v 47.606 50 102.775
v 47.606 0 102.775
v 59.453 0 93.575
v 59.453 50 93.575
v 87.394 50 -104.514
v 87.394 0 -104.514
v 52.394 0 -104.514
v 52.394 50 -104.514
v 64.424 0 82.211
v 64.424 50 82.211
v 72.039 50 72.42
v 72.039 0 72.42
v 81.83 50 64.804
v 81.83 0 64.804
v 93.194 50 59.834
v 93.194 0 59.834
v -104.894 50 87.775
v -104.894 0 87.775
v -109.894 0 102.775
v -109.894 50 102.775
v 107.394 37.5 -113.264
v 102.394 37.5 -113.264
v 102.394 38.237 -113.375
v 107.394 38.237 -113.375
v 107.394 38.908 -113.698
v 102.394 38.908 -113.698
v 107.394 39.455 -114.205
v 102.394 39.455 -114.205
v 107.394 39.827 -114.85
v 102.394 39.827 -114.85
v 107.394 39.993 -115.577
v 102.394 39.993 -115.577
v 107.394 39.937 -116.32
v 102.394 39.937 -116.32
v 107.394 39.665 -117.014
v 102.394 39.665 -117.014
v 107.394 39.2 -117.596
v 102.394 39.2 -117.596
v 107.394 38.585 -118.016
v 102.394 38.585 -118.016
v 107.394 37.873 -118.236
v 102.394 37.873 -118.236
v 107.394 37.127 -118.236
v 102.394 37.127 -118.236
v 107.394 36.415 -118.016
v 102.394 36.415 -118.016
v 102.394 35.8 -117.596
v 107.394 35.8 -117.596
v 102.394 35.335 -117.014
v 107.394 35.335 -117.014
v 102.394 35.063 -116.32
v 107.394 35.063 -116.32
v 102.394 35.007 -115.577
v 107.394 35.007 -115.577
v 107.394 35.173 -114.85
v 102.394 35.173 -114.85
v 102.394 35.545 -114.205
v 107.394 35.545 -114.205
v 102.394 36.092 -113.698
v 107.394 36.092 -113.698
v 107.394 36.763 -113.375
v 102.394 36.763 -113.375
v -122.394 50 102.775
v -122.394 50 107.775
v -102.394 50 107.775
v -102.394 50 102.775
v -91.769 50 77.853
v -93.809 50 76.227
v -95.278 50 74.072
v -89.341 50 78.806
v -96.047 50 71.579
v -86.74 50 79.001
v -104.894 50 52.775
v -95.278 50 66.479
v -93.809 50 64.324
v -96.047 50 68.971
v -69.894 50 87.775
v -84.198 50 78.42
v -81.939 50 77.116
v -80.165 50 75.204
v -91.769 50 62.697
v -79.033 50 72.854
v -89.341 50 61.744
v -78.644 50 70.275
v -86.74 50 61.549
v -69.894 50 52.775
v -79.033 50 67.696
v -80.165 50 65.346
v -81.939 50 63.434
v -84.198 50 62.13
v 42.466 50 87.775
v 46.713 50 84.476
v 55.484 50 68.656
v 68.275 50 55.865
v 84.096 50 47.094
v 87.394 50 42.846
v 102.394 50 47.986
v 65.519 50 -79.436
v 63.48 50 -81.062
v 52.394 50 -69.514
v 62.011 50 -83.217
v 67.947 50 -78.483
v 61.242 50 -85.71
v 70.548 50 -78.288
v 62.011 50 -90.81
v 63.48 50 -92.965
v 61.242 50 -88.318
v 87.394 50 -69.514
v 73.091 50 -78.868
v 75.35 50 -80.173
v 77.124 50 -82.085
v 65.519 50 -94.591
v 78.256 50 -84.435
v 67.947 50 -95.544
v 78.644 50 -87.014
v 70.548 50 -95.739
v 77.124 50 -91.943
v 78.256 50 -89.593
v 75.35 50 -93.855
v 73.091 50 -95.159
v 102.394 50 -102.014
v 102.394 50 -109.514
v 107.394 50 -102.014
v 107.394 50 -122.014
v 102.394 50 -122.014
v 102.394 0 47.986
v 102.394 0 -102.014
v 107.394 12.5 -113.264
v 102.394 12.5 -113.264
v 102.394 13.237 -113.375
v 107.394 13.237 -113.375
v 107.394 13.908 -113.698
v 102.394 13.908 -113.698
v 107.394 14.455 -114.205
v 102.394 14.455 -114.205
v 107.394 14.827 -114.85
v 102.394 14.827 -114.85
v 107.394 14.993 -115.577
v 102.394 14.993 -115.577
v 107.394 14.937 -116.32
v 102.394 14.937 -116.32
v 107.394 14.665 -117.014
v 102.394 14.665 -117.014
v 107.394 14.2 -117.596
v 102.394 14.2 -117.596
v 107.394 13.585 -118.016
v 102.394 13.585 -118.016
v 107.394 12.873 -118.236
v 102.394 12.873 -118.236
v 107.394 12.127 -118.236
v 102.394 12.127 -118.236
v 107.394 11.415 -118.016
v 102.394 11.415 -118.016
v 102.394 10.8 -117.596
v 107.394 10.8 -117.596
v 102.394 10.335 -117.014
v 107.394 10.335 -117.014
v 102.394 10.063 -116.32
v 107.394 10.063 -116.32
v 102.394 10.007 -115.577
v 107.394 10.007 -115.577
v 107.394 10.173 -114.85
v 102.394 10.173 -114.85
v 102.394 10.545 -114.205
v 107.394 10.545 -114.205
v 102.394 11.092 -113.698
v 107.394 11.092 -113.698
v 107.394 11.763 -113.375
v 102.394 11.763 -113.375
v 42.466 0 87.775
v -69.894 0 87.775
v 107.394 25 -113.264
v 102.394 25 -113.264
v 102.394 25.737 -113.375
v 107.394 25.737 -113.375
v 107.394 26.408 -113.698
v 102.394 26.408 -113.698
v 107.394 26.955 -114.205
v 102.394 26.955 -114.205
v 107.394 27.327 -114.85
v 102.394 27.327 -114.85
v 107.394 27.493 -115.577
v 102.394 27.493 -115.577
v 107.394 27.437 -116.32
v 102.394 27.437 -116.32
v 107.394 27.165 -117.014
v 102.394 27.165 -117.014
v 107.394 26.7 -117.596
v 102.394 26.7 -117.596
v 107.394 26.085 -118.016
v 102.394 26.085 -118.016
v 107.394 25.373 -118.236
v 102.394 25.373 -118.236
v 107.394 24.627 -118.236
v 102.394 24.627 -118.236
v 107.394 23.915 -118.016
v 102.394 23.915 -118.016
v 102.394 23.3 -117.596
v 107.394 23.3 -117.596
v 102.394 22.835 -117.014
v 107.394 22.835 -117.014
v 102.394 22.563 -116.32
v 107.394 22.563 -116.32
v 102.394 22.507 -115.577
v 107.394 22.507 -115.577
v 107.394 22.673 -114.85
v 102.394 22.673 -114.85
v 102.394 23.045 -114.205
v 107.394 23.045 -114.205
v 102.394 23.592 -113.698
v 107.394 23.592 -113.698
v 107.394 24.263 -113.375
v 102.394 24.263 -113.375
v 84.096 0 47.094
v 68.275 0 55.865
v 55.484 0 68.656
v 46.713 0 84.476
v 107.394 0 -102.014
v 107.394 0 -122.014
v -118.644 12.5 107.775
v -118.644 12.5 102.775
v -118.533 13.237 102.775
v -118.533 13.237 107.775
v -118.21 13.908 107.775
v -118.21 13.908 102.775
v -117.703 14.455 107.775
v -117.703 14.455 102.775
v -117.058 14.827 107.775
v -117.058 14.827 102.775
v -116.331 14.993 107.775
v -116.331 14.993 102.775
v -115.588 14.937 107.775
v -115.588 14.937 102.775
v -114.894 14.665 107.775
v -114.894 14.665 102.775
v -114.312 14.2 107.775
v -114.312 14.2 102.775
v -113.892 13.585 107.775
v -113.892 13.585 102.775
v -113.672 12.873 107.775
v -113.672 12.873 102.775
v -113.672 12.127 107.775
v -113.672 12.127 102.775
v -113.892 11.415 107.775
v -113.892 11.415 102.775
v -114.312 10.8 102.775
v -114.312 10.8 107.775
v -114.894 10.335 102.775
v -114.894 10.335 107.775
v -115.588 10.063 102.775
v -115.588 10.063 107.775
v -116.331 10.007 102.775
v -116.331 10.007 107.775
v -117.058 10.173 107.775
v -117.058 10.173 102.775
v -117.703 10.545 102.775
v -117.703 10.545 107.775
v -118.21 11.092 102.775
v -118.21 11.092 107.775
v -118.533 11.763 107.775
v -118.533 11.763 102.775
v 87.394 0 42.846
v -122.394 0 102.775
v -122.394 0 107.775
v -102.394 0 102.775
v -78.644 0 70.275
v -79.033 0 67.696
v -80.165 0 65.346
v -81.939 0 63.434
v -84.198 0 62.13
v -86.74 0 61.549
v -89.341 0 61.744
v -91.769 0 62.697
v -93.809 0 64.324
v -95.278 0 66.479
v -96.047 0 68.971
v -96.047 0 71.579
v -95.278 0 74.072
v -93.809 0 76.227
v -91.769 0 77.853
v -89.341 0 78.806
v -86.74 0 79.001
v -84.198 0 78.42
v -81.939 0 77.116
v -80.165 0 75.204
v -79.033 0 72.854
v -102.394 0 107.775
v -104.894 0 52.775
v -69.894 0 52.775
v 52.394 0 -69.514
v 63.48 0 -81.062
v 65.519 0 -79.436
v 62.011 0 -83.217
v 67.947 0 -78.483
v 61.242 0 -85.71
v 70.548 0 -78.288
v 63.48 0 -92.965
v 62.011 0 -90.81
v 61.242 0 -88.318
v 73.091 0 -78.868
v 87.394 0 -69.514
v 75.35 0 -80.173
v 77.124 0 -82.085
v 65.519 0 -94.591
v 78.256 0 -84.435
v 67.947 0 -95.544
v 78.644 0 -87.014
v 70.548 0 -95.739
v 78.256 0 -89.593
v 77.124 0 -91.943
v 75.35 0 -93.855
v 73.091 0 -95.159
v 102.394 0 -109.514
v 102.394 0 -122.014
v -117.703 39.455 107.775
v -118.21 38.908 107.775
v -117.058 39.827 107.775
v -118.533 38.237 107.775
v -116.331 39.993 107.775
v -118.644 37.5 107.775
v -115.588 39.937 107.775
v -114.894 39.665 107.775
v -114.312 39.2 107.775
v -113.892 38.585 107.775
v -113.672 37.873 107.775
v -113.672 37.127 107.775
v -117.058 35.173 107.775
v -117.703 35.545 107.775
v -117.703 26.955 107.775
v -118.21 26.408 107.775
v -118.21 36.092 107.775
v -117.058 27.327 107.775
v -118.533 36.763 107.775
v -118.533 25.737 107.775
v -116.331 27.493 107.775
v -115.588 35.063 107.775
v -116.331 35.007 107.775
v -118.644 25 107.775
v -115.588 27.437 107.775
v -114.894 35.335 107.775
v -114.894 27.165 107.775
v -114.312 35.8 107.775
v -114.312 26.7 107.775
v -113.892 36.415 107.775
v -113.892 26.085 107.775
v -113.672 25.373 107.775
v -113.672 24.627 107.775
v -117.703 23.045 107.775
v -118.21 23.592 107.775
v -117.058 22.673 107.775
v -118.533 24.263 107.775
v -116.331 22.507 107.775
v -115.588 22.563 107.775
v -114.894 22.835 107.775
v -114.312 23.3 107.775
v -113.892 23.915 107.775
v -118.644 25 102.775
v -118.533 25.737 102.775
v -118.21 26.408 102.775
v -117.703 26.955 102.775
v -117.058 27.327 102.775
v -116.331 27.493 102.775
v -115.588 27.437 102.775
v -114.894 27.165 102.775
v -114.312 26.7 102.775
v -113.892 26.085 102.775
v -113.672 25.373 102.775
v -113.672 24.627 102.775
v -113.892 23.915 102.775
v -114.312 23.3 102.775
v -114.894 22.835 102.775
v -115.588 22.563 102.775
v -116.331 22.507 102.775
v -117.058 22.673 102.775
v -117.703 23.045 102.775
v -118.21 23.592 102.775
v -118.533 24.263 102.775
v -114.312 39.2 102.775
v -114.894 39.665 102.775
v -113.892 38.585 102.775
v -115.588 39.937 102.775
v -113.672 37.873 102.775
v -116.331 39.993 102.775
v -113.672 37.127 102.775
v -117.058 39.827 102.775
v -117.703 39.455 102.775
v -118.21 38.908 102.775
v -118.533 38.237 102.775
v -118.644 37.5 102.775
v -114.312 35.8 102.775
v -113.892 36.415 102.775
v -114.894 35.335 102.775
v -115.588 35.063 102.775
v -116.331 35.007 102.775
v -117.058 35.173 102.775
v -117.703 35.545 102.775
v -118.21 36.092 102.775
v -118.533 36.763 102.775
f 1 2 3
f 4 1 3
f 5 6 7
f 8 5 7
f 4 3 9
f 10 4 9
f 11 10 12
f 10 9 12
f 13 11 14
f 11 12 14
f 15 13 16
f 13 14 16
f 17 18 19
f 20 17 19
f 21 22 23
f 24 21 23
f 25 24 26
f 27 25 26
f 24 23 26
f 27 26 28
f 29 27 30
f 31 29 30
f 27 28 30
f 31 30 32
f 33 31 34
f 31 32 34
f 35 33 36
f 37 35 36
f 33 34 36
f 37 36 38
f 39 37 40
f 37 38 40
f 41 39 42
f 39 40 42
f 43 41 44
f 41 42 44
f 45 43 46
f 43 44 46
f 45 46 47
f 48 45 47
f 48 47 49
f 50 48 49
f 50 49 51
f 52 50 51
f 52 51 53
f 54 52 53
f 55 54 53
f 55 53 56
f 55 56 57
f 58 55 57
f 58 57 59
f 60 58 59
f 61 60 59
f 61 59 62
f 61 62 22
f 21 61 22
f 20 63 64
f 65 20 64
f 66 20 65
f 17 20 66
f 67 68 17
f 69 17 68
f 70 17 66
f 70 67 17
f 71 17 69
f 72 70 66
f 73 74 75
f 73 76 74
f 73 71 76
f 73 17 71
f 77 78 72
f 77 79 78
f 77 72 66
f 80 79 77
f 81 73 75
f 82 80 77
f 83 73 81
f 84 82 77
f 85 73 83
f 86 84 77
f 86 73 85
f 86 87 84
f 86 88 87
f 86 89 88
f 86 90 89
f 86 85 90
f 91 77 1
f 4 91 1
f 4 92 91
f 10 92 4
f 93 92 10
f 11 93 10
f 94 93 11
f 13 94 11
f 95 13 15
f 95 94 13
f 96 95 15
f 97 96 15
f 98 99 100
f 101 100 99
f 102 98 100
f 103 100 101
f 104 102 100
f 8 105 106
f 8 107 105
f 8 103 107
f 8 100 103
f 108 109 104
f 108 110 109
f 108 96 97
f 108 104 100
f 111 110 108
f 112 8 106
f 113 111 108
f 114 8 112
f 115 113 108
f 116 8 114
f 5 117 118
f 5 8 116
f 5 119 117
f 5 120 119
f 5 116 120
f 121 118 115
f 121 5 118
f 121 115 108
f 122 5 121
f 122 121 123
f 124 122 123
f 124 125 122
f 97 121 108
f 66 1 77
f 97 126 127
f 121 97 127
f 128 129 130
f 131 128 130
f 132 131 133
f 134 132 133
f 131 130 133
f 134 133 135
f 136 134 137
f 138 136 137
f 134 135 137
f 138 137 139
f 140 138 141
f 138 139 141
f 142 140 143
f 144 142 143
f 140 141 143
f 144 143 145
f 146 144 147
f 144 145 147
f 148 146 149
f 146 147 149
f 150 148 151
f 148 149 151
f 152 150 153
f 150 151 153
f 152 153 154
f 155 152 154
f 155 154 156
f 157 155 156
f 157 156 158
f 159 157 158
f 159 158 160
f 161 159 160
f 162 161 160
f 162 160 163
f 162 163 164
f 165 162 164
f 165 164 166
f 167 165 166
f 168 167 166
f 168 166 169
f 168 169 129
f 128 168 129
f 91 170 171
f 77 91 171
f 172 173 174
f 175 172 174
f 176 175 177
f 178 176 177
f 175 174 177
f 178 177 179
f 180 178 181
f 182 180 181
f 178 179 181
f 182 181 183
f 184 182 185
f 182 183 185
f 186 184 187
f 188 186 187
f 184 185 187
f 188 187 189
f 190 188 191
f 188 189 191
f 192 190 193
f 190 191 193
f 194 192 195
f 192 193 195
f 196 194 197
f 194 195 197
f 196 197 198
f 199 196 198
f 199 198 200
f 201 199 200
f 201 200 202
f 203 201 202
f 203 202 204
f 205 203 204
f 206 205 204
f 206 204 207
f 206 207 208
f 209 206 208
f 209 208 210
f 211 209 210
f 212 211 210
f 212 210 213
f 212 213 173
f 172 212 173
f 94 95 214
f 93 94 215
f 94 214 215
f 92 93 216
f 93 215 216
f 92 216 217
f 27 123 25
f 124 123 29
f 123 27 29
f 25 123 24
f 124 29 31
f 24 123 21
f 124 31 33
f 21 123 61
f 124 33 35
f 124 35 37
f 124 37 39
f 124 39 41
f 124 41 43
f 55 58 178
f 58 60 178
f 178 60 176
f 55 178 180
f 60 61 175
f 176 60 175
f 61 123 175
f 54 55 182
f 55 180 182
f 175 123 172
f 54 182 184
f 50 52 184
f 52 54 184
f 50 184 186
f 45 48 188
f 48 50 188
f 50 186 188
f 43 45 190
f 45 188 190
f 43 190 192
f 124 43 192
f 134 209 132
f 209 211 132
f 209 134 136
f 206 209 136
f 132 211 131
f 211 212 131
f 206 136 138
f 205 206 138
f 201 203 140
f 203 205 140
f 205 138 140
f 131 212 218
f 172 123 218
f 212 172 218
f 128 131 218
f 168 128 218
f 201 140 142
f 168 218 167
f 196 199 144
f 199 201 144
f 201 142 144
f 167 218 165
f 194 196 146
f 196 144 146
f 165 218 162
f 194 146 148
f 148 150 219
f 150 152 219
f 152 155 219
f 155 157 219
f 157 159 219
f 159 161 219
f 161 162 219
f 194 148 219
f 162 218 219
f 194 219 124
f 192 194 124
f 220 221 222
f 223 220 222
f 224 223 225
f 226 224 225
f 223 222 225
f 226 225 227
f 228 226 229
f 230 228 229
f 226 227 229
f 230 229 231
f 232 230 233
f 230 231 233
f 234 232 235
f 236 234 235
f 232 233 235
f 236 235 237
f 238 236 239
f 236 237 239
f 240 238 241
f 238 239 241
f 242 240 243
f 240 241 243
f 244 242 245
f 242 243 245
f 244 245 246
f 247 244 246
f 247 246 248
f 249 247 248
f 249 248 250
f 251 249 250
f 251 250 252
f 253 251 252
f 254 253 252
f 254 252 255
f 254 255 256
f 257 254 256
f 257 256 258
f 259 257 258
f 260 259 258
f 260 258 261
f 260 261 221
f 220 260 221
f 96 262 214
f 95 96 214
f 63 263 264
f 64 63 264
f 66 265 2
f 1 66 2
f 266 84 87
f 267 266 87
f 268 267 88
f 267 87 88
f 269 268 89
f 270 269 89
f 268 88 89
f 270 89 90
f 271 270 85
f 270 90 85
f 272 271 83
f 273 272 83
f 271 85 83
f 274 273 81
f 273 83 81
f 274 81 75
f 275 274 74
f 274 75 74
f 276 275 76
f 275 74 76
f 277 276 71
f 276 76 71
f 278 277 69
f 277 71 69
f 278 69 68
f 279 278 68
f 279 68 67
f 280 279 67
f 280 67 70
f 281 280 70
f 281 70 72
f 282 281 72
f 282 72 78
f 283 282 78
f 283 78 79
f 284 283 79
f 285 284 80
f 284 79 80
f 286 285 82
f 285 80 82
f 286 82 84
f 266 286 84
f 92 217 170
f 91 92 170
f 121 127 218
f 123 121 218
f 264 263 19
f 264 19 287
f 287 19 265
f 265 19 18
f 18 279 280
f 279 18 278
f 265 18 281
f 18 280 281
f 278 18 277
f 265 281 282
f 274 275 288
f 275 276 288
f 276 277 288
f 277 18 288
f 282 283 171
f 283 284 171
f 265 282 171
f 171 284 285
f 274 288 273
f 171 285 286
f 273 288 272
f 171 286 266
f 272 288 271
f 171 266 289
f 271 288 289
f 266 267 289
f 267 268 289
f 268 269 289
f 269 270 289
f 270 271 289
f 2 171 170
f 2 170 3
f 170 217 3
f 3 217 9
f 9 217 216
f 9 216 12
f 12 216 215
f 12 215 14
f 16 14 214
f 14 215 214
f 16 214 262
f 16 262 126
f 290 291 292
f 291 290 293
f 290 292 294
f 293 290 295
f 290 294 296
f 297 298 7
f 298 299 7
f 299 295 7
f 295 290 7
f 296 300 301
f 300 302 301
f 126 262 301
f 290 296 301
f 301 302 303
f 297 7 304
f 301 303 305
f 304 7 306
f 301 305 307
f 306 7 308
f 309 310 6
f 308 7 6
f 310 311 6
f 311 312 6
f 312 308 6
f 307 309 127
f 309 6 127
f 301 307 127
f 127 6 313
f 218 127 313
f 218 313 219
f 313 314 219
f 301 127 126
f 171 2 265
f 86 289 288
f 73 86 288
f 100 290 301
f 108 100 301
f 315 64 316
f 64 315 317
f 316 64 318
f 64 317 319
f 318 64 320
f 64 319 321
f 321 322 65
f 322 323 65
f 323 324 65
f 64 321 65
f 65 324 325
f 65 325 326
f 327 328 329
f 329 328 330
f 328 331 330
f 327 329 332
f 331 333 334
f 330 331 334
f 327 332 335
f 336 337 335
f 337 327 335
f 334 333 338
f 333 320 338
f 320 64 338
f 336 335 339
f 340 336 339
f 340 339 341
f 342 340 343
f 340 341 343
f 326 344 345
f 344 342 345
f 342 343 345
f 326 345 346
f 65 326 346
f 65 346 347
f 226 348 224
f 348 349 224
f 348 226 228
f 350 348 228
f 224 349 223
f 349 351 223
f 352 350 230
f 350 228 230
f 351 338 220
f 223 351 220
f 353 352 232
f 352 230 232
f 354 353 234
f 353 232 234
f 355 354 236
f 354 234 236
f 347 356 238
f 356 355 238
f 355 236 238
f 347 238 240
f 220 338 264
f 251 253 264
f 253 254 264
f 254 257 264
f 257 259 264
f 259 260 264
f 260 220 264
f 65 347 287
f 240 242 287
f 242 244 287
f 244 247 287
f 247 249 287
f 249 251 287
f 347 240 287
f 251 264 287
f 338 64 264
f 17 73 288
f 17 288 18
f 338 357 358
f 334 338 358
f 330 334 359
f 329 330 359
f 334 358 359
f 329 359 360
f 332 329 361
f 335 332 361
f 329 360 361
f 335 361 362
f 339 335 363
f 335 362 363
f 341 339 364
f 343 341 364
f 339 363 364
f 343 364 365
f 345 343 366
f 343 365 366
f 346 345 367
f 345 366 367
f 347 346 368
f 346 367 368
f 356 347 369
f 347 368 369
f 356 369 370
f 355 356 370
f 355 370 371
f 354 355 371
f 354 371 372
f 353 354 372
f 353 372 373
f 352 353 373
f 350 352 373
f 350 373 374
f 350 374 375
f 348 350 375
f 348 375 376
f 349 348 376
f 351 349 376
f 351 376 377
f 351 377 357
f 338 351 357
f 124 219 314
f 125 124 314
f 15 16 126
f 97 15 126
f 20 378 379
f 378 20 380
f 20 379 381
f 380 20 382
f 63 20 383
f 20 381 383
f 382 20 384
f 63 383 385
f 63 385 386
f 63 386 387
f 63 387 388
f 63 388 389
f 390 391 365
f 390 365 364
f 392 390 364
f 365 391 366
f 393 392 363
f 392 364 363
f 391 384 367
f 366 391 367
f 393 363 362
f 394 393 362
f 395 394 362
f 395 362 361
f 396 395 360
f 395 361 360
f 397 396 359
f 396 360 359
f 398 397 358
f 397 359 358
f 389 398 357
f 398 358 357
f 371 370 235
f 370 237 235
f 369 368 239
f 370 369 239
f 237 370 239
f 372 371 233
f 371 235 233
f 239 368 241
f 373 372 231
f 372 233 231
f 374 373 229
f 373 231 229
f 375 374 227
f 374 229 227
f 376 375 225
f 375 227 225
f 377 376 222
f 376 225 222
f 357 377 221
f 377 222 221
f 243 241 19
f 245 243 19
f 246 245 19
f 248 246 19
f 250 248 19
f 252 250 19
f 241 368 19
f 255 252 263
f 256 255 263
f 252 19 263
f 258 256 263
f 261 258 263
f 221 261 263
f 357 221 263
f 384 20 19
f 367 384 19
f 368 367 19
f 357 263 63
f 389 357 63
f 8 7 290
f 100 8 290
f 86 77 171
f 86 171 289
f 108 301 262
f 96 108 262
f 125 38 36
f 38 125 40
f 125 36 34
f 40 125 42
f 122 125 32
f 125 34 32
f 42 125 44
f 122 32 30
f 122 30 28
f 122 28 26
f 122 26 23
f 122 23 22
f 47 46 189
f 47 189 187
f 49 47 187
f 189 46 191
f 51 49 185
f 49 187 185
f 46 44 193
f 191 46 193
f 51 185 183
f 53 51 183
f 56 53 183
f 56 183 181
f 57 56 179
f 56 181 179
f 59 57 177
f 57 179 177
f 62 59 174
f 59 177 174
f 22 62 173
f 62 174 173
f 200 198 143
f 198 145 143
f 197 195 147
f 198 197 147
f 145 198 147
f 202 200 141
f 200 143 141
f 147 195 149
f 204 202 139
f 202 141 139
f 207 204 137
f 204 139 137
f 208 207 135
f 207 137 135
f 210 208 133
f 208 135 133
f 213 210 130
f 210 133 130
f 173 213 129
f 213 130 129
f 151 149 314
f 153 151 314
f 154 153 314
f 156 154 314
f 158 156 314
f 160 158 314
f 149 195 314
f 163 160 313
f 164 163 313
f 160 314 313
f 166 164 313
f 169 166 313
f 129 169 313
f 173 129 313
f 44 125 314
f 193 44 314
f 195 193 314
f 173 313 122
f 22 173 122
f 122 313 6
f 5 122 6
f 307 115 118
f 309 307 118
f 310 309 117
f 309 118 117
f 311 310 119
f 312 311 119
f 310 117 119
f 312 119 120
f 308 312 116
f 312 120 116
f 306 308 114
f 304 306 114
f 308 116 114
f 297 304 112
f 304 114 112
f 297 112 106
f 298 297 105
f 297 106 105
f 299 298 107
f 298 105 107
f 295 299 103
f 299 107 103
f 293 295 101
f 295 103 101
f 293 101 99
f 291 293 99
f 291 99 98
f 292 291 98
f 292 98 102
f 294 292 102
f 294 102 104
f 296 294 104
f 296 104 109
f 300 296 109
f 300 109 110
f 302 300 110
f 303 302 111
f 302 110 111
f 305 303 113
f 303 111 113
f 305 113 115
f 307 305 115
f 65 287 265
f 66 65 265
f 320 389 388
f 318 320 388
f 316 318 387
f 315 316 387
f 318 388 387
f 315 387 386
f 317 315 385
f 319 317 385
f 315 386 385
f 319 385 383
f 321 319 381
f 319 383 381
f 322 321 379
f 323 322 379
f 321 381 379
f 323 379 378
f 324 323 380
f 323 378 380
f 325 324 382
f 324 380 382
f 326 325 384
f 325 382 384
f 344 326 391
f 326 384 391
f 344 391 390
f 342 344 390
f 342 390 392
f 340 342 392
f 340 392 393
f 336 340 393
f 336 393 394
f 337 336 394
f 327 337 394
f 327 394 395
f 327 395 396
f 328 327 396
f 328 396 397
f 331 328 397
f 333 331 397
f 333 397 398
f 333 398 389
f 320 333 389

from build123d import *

# Parameters (mm, degrees)
BOSS_EXTRUDE1_DEPTH = 50
SKETCH3_R           = 8.75
CUT_EXTRUDE1_DEPTH  = 50
SKETCH5_R           = 2.5
CUT_EXTRUDE3_DEPTH  = 10
SKETCH6_R           = 2.5
CUT_EXTRUDE4_DEPTH  = 10


with BuildPart() as part:
    # Sketch2 → Boss-Extrude1 (new body)
    with BuildSketch(Plane(origin=(0, 0, 0), x_dir=(1, 0, 0), z_dir=(0, 1, 0))):
        with BuildLine():
            Line((-54.874212294, -102.775031025), (47.605671551, -102.775031025))
            Line((47.605671551, -102.775031025), (59.453092269, -93.575105898))
            ThreePointArc((59.453092269, -93.575105898), (72.038989389, -72.419691965), (93.194403322, -59.833794845))
            Line((93.194403322, -59.833794845), (102.394328449, -47.986374127))
            Line((102.394328449, -47.986374127), (102.394328449, 56.694970167))
            Line((102.394328449, 56.694970167), (102.394328449, 102.013625873))
            Line((102.394328449, 102.013625873), (107.394328449, 102.013625873))
            Line((107.394328449, 102.013625873), (107.394328449, 122.013625873))
            Line((107.394328449, 122.013625873), (102.394328449, 122.013625873))
            Line((102.394328449, 122.013625873), (102.394328449, 109.513625873))
            Line((102.394328449, 109.513625873), (87.394328449, 104.513625873))
            Line((87.394328449, 104.513625873), (52.394328449, 104.513625873))
            Line((52.394328449, 104.513625873), (52.394328449, 69.513625873))
            Line((52.394328449, 69.513625873), (87.394328449, 69.513625873))
            Line((87.394328449, 69.513625873), (87.394328449, -42.846257379))
            Line((87.394328449, -42.846257379), (84.095735231, -47.094098648))
            ThreePointArc((84.095735231, -47.094098648), (61.432387672, -61.813090248), (46.713396072, -84.476437807))
            Line((46.713396072, -84.476437807), (42.465554802, -87.775031025))
            Line((42.465554802, -87.775031025), (-69.894328449, -87.775031025))
            Line((-69.894328449, -87.775031025), (-69.894328449, -52.775031025))
            Line((-69.894328449, -52.775031025), (-104.894328449, -52.775031025))
            Line((-104.894328449, -52.775031025), (-104.894328449, -87.775031025))
            Line((-104.894328449, -87.775031025), (-109.894328449, -102.775031025))
            Line((-109.894328449, -102.775031025), (-122.394328449, -102.775031025))
            Line((-122.394328449, -102.775031025), (-122.394328449, -107.775031025))
            Line((-122.394328449, -107.775031025), (-102.394328449, -107.775031025))
            Line((-102.394328449, -107.775031025), (-102.394328449, -102.775031025))
            Line((-102.394328449, -102.775031025), (-54.874212294, -102.775031025))
        make_face()
    extrude(amount=BOSS_EXTRUDE1_DEPTH)

    # Sketch3 → Cut-Extrude1 (cut)
    with BuildSketch(Plane(origin=(0, 50, 0), x_dir=(1, 0, 0), z_dir=(0, 1, 0))):
        with Locations((-87.394328449, -70.275031025)):
            Circle(SKETCH3_R)
        with Locations((69.894328449, 87.013625873)):
            Circle(SKETCH3_R)
    extrude(amount=-CUT_EXTRUDE1_DEPTH, mode=Mode.SUBTRACT)

    # Sketch5 → Cut-Extrude3 (cut)
    with BuildSketch(Plane(origin=(0, 0, 102.775031025), x_dir=(-1, 0, 0), z_dir=(0, 0, -1))):
        with Locations((116.144328449, 37.5)):
            Circle(SKETCH5_R)
        with Locations((116.144328449, 25)):
            Circle(SKETCH5_R)
        with Locations((116.144328449, 12.5)):
            Circle(SKETCH5_R)
    extrude(amount=-CUT_EXTRUDE3_DEPTH, mode=Mode.SUBTRACT)

    # Sketch6 → Cut-Extrude4 (cut)
    with BuildSketch(Plane.ZY.offset(-102.394328449)):
        with Locations((-115.763625873, 37.5)):
            Circle(SKETCH6_R)
        with Locations((-115.763625873, 25)):
            Circle(SKETCH6_R)
        with Locations((-115.763625873, 12.5)):
            Circle(SKETCH6_R)
    extrude(amount=-CUT_EXTRUDE4_DEPTH, mode=Mode.SUBTRACT)


solid = part.part
